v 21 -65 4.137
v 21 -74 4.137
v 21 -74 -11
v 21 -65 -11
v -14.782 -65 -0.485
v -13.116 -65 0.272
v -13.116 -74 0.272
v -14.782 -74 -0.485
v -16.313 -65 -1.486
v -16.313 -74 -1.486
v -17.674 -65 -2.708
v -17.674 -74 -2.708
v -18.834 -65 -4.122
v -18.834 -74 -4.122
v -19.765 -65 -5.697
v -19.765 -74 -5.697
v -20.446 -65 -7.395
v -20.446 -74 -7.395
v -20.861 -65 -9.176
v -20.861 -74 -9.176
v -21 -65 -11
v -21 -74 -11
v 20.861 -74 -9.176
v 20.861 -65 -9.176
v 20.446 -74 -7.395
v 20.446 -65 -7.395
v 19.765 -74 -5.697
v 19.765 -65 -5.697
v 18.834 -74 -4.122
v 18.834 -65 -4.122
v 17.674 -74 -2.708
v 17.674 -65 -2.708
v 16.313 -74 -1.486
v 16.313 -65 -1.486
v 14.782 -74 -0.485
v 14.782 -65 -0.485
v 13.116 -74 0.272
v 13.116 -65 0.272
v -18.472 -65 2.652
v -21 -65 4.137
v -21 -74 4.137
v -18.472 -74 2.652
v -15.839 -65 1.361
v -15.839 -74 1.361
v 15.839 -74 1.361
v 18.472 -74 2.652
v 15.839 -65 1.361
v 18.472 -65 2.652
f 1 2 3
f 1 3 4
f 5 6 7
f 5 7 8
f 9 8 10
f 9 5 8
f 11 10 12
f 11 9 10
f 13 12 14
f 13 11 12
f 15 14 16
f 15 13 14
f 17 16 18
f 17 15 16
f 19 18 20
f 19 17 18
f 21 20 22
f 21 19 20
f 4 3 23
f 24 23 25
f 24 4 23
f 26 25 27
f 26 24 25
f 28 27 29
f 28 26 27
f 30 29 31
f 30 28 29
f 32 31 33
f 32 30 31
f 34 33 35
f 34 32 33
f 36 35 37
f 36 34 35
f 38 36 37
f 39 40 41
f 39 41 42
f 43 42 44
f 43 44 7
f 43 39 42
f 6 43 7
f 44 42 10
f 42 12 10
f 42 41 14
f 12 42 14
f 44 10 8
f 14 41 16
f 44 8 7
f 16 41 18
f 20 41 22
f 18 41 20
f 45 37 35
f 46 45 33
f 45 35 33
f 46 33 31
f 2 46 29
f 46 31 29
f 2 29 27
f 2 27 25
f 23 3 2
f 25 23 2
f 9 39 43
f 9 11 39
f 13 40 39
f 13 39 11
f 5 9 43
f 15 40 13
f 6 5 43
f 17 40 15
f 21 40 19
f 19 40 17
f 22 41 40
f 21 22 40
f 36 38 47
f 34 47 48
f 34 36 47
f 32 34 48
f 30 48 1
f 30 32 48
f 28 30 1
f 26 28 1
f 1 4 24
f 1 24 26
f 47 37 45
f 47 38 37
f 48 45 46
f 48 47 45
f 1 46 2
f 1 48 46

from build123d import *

# Parameters (mm, degrees)
CYLINDER2689_R     = 39
CYLINDER2689_DEPTH = 20
CYLINDER2688_R     = 12
CYLINDER2688_DEPTH = 14
CYLINDER2687_R     = 12
CYLINDER2687_DEPTH = 14
BOX920_W           = 12
BOX920_H           = 9
BOX920_DEPTH       = 16
BOX919_W           = 12
BOX919_H           = 9
BOX919_DEPTH       = 16


with BuildPart() as v_lec2659:
    # Cylinder2689 → Cylinder2689 (new body)
    with BuildSketch(Plane(origin=(0, -54, 37), x_dir=(1, 0, 0), z_dir=(0, -1, 0))):
        Circle(CYLINDER2689_R)
    extrude(amount=CYLINDER2689_DEPTH)


with BuildPart() as v_lec2658:
    # Cylinder2688 → Cylinder2688 (new body)
    with BuildSketch(Plane(origin=(-9, -60, -11), x_dir=(1, 0, 0), z_dir=(0, -1, 0))):
        Circle(CYLINDER2688_R)
    extrude(amount=CYLINDER2688_DEPTH)


with BuildPart() as compound1197:
    # Cylinder2687 → Cylinder2687 (new body)
    with BuildSketch(Plane(origin=(9, -60, -11), x_dir=(1, 0, 0), z_dir=(0, -1, 0))):
        Circle(CYLINDER2687_R)
    extrude(amount=CYLINDER2687_DEPTH)

    # Compound1197: union Válec2658
    add(v_lec2658.part)


with BuildPart() as krychle919:
    # Box920 → Box920 (new body)
    with BuildSketch(Plane(origin=(-21, -74, -11), x_dir=(1, 0, 0), z_dir=(0, 0, 1))):
        with Locations((6, 4.5)):
            Rectangle(BOX920_W, BOX920_H)
    extrude(amount=BOX920_DEPTH)


with BuildPart() as cut1009:
    # Box919 → Box919 (new body)
    with BuildSketch(Plane(origin=(9, -74, -11), x_dir=(1, 0, 0), z_dir=(0, 0, 1))):
        with Locations((6, 4.5)):
            Rectangle(BOX919_W, BOX919_H)
    extrude(amount=BOX919_DEPTH)

    # Compound1196: union Krychle919
    add(krychle919.part)

    # Cut1008: cut Compound1197
    add(compound1197.part, mode=Mode.SUBTRACT)

    # Cut1009: cut Válec2659
    add(v_lec2659.part, mode=Mode.SUBTRACT)


solid = cut1009.part
